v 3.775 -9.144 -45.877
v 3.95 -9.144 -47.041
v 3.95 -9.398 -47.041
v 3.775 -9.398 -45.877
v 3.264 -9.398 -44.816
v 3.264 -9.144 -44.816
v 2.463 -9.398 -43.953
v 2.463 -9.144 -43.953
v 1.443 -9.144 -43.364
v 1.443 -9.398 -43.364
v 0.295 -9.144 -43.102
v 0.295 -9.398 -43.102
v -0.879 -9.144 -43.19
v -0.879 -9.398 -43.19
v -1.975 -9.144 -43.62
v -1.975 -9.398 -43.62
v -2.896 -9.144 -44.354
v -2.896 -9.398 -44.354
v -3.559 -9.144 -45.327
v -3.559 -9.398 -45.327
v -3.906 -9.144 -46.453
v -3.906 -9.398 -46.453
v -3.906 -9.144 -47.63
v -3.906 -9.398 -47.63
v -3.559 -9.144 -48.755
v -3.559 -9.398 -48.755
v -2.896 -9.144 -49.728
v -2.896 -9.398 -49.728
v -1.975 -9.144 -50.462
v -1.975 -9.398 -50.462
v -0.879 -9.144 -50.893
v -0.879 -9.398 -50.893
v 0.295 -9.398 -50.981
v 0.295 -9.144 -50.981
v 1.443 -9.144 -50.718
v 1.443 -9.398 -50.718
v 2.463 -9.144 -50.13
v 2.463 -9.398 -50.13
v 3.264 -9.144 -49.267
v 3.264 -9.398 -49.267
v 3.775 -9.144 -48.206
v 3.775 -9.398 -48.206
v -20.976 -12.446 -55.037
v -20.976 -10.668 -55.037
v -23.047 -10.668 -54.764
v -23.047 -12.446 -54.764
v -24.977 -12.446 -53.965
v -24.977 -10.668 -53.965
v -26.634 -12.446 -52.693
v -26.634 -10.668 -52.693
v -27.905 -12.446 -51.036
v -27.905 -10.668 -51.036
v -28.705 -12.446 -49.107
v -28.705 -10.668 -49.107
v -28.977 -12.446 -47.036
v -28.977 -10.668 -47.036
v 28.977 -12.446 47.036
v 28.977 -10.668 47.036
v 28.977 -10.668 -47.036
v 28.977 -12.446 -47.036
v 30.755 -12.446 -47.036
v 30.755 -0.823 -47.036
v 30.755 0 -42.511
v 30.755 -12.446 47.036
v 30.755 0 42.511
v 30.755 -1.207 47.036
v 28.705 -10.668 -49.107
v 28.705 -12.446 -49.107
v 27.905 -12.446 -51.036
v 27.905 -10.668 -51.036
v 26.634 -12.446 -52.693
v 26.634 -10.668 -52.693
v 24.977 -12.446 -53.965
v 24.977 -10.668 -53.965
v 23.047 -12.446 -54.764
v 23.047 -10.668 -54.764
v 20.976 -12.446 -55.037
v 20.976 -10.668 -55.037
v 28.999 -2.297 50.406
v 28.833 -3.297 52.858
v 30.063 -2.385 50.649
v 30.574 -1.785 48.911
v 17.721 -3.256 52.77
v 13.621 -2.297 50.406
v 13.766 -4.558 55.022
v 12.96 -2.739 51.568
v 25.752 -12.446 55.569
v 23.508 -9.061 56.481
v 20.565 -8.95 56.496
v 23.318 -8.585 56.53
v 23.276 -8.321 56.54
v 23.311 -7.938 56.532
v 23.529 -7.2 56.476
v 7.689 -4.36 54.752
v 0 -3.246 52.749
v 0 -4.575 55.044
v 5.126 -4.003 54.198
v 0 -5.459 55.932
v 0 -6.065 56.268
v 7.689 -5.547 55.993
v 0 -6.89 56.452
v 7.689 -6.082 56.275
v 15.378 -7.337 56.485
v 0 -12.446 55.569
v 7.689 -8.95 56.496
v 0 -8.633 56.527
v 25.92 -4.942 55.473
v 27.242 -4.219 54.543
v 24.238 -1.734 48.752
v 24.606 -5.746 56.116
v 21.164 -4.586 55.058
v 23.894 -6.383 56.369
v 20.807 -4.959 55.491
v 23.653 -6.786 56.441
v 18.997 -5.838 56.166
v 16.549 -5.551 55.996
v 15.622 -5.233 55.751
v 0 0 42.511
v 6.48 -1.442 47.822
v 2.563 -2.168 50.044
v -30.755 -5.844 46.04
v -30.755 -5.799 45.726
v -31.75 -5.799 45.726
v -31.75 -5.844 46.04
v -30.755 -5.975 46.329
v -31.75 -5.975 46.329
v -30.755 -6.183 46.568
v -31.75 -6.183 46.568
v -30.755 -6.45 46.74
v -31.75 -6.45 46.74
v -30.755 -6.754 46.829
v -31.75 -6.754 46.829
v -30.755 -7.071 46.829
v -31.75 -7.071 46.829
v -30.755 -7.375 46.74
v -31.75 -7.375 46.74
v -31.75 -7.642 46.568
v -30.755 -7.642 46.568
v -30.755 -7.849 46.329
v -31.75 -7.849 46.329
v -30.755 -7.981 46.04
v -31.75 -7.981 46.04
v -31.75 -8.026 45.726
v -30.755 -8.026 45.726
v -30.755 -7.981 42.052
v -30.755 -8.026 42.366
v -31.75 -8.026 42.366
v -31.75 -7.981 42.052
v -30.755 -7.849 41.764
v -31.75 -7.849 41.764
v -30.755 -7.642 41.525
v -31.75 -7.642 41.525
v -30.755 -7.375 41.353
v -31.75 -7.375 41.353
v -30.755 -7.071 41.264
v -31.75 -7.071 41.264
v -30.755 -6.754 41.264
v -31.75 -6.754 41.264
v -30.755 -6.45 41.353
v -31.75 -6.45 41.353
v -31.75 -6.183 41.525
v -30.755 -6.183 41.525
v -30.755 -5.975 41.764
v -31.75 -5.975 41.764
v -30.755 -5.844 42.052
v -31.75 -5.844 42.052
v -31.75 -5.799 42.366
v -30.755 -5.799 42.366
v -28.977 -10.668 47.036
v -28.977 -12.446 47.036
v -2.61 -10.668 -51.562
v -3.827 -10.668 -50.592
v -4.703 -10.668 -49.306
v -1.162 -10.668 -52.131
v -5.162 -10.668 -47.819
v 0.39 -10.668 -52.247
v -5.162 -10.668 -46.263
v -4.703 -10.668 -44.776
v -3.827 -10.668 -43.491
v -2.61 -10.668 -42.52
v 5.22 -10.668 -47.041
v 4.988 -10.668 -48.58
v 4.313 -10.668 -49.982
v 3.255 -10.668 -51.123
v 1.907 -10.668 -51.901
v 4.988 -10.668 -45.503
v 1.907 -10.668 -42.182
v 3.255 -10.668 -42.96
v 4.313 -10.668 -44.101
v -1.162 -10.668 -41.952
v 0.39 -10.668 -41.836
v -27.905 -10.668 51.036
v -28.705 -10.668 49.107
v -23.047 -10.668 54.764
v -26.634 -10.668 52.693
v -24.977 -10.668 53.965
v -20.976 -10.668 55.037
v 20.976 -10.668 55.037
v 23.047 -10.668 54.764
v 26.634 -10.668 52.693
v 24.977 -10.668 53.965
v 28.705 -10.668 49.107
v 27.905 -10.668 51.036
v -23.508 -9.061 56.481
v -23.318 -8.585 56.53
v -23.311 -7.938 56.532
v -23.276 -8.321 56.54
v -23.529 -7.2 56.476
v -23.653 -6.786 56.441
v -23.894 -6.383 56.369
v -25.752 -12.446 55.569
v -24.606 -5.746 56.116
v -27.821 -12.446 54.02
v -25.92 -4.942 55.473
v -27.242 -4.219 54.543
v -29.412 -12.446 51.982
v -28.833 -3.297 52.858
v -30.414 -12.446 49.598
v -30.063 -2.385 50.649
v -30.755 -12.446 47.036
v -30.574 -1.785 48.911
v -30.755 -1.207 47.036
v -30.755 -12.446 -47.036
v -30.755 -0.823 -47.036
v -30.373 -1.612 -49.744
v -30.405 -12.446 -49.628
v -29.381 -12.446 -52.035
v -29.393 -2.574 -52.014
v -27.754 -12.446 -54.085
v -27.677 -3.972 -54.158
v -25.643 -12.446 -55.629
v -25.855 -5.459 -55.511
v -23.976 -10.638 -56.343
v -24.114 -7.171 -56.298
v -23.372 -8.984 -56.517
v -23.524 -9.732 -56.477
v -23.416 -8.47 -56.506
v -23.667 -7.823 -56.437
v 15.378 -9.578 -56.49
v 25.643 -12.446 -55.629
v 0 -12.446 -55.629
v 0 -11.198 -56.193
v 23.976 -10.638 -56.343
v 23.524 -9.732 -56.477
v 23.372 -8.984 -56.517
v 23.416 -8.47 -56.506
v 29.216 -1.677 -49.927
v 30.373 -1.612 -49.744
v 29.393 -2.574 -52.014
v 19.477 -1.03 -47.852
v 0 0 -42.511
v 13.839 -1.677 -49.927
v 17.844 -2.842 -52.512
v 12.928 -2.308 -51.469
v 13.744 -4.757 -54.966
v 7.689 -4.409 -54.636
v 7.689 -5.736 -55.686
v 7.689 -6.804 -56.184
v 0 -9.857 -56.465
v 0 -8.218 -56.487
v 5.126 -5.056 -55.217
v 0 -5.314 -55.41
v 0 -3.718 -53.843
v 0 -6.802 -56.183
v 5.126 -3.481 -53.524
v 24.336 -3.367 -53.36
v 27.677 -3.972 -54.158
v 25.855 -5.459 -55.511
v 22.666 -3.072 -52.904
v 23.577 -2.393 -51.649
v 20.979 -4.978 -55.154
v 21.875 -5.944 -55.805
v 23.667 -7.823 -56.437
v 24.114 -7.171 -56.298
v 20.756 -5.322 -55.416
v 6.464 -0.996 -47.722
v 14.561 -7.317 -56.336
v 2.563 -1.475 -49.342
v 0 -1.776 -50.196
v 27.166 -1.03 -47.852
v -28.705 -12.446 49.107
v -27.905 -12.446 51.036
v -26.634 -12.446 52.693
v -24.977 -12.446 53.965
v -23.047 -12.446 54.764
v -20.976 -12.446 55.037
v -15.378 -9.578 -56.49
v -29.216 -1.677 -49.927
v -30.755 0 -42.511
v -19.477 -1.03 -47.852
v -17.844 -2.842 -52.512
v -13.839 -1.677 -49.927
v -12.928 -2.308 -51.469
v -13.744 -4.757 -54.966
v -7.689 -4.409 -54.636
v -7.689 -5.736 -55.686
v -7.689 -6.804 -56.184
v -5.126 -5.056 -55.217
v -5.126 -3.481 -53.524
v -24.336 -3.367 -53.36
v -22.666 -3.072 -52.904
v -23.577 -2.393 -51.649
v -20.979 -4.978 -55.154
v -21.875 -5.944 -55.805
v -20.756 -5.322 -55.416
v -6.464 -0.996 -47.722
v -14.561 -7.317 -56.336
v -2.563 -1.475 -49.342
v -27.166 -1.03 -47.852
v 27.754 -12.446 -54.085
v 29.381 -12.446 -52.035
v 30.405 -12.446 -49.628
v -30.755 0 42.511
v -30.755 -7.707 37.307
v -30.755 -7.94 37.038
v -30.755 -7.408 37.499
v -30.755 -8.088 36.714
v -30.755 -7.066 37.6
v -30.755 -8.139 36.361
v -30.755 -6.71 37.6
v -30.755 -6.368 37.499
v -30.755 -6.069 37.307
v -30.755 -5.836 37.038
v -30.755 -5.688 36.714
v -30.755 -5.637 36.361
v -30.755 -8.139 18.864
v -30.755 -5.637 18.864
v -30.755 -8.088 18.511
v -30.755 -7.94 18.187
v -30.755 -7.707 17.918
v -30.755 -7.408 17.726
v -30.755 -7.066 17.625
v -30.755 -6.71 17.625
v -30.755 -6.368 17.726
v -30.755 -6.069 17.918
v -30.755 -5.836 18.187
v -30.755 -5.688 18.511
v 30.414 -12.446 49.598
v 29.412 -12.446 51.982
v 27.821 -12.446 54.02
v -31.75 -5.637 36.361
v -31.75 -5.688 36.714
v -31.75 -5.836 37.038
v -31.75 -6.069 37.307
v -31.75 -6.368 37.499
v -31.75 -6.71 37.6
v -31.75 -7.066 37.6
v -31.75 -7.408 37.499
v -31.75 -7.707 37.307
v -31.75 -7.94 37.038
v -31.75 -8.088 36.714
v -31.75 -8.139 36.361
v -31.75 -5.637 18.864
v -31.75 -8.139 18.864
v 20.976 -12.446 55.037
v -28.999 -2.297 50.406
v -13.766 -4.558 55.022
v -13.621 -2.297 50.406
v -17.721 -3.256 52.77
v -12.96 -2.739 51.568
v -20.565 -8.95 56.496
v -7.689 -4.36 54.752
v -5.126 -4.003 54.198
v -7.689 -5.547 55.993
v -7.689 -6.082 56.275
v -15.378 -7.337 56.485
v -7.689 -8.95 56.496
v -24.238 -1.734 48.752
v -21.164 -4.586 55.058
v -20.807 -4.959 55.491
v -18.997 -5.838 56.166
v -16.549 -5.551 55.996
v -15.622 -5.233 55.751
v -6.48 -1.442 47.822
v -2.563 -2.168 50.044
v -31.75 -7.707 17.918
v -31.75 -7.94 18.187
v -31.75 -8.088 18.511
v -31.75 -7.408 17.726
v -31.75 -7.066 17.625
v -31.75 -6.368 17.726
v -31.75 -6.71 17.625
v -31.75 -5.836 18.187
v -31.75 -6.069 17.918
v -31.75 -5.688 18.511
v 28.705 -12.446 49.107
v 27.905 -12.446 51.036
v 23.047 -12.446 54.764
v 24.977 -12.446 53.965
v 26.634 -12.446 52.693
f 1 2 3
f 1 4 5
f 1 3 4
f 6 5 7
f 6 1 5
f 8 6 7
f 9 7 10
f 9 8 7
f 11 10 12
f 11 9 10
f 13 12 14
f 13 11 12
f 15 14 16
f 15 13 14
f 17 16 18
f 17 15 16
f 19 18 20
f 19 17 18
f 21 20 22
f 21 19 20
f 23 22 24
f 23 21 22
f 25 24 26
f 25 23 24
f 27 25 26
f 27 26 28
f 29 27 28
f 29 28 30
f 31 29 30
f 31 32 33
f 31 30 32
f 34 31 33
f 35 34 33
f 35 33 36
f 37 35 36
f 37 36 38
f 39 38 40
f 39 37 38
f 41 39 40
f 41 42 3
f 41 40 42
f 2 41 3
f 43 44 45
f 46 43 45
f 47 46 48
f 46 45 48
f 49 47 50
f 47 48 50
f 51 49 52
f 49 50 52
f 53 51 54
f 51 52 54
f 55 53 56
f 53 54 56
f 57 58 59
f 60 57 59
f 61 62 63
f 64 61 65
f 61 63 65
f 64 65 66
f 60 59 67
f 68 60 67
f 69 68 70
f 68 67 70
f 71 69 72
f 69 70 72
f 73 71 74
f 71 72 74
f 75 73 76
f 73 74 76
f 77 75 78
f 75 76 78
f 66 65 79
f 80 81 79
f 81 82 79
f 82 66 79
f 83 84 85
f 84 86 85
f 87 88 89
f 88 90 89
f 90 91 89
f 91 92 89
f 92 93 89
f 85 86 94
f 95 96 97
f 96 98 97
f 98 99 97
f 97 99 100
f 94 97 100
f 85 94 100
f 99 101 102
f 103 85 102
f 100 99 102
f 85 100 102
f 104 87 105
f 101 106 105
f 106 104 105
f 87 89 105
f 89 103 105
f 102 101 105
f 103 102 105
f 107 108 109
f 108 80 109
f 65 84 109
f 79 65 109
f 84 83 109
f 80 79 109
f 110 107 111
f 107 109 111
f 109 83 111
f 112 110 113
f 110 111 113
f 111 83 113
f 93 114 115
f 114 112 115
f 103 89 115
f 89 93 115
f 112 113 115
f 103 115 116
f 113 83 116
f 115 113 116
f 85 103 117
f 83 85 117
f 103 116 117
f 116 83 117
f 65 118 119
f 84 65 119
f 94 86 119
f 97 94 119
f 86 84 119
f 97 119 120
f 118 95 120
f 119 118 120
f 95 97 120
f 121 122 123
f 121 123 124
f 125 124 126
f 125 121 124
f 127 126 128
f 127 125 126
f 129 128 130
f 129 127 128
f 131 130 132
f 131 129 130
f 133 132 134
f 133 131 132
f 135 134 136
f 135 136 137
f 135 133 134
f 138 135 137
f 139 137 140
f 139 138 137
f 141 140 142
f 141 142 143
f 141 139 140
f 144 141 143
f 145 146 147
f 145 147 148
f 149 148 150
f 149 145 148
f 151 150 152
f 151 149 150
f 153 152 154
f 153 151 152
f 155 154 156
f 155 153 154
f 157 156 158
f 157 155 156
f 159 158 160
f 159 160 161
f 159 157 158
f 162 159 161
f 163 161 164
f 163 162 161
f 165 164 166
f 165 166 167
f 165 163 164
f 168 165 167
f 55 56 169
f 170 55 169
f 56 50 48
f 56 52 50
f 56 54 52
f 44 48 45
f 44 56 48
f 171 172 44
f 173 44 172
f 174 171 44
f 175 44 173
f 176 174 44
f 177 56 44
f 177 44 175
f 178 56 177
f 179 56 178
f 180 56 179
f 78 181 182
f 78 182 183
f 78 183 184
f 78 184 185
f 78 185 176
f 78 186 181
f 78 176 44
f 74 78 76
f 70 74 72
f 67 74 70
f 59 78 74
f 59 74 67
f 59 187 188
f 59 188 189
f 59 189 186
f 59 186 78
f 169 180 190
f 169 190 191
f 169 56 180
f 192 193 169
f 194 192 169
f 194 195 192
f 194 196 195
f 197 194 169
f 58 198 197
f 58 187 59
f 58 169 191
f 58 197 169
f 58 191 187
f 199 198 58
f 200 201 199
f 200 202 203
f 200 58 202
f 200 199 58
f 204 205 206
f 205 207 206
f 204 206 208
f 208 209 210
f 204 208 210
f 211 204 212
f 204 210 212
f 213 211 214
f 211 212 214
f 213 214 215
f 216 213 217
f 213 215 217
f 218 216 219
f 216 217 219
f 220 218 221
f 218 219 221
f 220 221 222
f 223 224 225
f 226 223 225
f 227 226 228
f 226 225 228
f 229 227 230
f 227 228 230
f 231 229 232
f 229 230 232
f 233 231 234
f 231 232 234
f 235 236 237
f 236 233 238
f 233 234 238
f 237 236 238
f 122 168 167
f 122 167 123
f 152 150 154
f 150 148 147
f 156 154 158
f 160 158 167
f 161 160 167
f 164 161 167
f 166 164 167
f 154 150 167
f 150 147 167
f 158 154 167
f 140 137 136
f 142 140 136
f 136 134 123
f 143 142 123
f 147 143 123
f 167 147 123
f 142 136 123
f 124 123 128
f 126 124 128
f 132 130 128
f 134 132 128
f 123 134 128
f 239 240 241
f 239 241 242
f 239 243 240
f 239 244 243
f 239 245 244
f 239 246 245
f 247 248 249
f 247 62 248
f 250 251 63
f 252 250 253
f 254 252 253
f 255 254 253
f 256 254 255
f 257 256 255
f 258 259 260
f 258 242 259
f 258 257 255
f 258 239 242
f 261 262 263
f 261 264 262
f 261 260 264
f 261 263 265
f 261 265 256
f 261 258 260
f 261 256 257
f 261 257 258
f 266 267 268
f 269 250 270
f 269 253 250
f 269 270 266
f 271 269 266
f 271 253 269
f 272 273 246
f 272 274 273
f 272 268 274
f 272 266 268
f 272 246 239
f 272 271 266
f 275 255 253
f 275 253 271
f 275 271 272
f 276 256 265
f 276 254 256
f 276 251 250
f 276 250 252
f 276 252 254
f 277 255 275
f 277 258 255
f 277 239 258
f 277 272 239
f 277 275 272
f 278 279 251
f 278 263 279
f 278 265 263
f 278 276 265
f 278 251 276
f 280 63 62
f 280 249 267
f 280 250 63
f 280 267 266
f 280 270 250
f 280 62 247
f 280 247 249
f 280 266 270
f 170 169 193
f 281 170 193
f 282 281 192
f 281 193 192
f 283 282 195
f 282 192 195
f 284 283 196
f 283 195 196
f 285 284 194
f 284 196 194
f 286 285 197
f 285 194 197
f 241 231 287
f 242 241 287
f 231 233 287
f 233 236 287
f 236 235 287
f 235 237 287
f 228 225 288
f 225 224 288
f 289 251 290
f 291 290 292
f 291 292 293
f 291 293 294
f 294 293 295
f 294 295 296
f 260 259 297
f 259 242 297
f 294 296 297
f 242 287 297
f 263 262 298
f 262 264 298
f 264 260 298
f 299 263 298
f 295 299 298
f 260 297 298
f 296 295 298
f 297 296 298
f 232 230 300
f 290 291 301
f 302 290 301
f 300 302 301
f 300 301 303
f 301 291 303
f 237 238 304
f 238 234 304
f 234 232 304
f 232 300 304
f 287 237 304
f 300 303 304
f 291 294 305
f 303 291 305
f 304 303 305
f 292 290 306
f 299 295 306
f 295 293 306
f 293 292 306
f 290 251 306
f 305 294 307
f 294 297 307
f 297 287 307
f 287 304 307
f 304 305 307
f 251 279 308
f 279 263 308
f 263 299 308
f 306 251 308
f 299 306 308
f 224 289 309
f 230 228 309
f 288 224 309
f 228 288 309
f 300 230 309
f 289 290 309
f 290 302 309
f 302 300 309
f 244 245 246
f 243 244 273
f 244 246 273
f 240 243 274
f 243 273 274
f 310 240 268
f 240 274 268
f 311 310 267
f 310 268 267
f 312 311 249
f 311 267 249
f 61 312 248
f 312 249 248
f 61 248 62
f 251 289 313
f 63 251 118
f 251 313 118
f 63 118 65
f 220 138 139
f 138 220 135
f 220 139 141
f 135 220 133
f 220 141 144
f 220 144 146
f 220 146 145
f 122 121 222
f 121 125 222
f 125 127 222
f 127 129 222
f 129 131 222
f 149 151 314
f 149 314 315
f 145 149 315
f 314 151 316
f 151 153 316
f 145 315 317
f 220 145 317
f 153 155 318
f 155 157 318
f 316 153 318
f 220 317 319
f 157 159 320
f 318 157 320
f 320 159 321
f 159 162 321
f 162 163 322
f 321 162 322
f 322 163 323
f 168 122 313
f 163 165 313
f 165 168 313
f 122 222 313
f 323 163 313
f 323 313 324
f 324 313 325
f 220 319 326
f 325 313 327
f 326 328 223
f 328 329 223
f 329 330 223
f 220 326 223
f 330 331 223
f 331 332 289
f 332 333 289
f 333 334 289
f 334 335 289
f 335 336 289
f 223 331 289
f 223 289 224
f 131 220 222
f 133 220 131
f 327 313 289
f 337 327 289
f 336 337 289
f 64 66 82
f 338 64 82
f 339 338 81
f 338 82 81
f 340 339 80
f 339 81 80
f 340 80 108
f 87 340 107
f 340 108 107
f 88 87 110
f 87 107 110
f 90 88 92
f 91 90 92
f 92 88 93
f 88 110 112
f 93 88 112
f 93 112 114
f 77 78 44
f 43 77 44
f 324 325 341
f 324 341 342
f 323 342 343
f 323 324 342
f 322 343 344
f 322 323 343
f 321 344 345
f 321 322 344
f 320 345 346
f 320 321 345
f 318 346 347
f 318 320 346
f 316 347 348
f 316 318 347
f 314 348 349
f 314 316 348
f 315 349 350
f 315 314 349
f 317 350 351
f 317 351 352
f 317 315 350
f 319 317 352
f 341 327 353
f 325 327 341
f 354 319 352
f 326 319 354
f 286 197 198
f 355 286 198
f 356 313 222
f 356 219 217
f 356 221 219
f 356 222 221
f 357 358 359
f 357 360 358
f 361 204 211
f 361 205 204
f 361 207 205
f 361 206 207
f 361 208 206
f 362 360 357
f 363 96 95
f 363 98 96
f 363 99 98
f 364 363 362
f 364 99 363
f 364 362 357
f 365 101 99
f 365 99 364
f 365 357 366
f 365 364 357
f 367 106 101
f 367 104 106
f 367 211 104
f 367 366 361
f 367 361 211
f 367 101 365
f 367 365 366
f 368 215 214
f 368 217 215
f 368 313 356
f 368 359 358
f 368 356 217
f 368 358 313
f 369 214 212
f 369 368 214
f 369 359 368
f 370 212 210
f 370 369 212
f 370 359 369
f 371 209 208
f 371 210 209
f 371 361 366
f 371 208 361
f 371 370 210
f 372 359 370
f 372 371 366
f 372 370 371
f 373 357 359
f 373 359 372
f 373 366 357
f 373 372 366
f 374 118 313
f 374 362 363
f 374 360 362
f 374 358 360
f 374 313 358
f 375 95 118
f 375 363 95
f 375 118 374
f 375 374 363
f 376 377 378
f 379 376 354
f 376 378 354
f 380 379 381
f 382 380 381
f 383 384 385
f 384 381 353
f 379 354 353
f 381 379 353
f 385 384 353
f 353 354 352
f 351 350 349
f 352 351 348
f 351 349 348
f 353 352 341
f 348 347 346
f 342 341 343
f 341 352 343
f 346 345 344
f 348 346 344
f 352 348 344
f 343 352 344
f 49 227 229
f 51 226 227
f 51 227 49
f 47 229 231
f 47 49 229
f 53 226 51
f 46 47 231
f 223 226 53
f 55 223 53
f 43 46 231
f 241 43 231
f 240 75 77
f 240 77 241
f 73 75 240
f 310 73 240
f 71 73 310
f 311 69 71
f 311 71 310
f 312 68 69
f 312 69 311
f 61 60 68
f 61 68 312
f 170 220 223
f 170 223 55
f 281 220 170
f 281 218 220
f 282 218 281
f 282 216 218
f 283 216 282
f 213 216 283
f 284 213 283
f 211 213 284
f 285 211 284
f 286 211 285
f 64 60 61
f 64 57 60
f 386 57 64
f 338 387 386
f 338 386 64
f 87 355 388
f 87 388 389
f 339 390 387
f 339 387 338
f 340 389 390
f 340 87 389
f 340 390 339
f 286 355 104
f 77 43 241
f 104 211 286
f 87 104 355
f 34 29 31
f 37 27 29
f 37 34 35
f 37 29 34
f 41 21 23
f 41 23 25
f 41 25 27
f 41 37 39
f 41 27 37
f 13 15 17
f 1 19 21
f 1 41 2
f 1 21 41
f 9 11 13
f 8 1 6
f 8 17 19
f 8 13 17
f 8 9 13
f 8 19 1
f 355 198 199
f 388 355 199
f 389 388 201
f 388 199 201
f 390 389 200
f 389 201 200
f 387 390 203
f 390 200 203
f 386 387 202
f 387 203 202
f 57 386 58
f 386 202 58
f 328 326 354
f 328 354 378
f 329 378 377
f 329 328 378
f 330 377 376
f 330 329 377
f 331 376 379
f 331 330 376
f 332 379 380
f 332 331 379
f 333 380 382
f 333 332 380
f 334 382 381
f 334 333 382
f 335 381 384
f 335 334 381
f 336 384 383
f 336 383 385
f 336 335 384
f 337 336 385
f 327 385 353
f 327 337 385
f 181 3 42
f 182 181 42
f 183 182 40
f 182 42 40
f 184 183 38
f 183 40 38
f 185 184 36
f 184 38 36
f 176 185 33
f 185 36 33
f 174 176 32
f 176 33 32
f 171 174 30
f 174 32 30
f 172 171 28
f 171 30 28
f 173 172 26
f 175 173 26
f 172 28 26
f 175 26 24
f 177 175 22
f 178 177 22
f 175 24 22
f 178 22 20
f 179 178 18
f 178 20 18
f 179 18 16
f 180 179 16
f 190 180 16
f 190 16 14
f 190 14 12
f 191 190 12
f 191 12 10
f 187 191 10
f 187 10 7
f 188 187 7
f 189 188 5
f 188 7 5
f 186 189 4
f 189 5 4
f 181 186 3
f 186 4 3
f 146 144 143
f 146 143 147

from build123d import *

# Parameters (mm, degrees)
F0_R     = 3.9502971089
F1_DEPTH = 10.668
F2_DEPTH = 12.446
F3_START = 9.144
F3_DEPTH = 9.906
F4_SIZE  = 1.27
F6_DEPTH = 34.798
F8_DEPTH = 31.75


with BuildPart() as f1:
    # F0 (on Front) → F1 (new body)
    with BuildSketch(Plane.XZ):
        with BuildLine():
            Line((-20.9762947197, -56.8147292361), (20.9762947197, -56.8147292361))
            ThreePointArc((20.9762947197, -56.8147292361), (27.8910919329, -53.9505264493), (30.7552947197, -47.0357292361))
            Line((30.7552947197, -47.0357292361), (30.7552947197, 47.0357292361))
            ThreePointArc((30.7552947197, 47.0357292361), (27.8910919329, 53.9505264493), (20.9762947197, 56.8147292361))
            Line((20.9762947197, 56.8147292361), (-20.9762947197, 56.8147292361))
            ThreePointArc((-20.9762947197, 56.8147292361), (-27.8910919329, 53.9505264493), (-30.7552947197, 47.0357292361))
            Line((-30.7552947197, 47.0357292361), (-30.7552947197, -47.0357292361))
            ThreePointArc((-30.7552947197, -47.0357292361), (-27.8910919329, -53.9505264493), (-20.9762947197, -56.8147292361))
        make_face()
        with BuildLine():
            ThreePointArc((20.9762947197, 55.0367310643), (26.6338573688, 52.6932918851), (28.977296548, 47.0357292361))
            Line((28.977296548, 47.0357292361), (28.977296548, -47.0357292361))
            ThreePointArc((28.977296548, -47.0357292361), (26.6338573688, -52.6932918851), (20.9762947197, -55.0367310643))
            Line((20.9762947197, -55.0367310643), (-20.9762947197, -55.0367310643))
            ThreePointArc((-20.9762947197, -55.0367310643), (-26.6338573688, -52.6932918851), (-28.977296548, -47.0357292361))
            Line((-28.977296548, -47.0357292361), (-28.977296548, 47.0357292361))
            ThreePointArc((-28.977296548, 47.0357292361), (-26.6338573688, 52.6932918851), (-20.9762947197, 55.0367310643))
            Line((-20.9762947197, 55.0367310643), (20.9762947197, 55.0367310643))
        make_face(mode=Mode.SUBTRACT)
        with BuildLine():
            Line((28.977296548, -47.0357292361), (28.977296548, 47.0357292361))
            ThreePointArc((28.977296548, 47.0357292361), (26.6338573688, 52.6932918851), (20.9762947197, 55.0367310643))
            Line((20.9762947197, 55.0367310643), (-20.9762947197, 55.0367310643))
            ThreePointArc((-20.9762947197, 55.0367310643), (-26.6338573688, 52.6932918851), (-28.977296548, 47.0357292361))
            Line((-28.977296548, 47.0357292361), (-28.977296548, -47.0357292361))
            ThreePointArc((-28.977296548, -47.0357292361), (-26.6338573688, -52.6932918851), (-20.9762947197, -55.0367310643))
            Line((-20.9762947197, -55.0367310643), (20.9762947197, -55.0367310643))
            ThreePointArc((20.9762947197, -55.0367310643), (26.6338573688, -52.6932918851), (28.977296548, -47.0357292361))
        make_face()
        with Locations((0, -47.0412708819)):
            Circle(F0_R, mode=Mode.SUBTRACT)
        with Locations((0, -47.0412708819)):
            Circle(F0_R)
    extrude(amount=F1_DEPTH)

    # F0 (on Front) → F2 (join)
    with BuildSketch(Plane.XZ):
        with BuildLine():
            Line((-20.9762947197, -56.8147292361), (20.9762947197, -56.8147292361))
            ThreePointArc((20.9762947197, -56.8147292361), (27.8910919329, -53.9505264493), (30.7552947197, -47.0357292361))
            Line((30.7552947197, -47.0357292361), (30.7552947197, 47.0357292361))
            ThreePointArc((30.7552947197, 47.0357292361), (27.8910919329, 53.9505264493), (20.9762947197, 56.8147292361))
            Line((20.9762947197, 56.8147292361), (-20.9762947197, 56.8147292361))
            ThreePointArc((-20.9762947197, 56.8147292361), (-27.8910919329, 53.9505264493), (-30.7552947197, 47.0357292361))
            Line((-30.7552947197, 47.0357292361), (-30.7552947197, -47.0357292361))
            ThreePointArc((-30.7552947197, -47.0357292361), (-27.8910919329, -53.9505264493), (-20.9762947197, -56.8147292361))
        make_face()
        with BuildLine():
            ThreePointArc((20.9762947197, 55.0367310643), (26.6338573688, 52.6932918851), (28.977296548, 47.0357292361))
            Line((28.977296548, 47.0357292361), (28.977296548, -47.0357292361))
            ThreePointArc((28.977296548, -47.0357292361), (26.6338573688, -52.6932918851), (20.9762947197, -55.0367310643))
            Line((20.9762947197, -55.0367310643), (-20.9762947197, -55.0367310643))
            ThreePointArc((-20.9762947197, -55.0367310643), (-26.6338573688, -52.6932918851), (-28.977296548, -47.0357292361))
            Line((-28.977296548, -47.0357292361), (-28.977296548, 47.0357292361))
            ThreePointArc((-28.977296548, 47.0357292361), (-26.6338573688, 52.6932918851), (-20.9762947197, 55.0367310643))
            Line((-20.9762947197, 55.0367310643), (20.9762947197, 55.0367310643))
        make_face(mode=Mode.SUBTRACT)
    extrude(amount=F2_DEPTH)

    # F0 (on Front) → F3 (cut)
    with BuildSketch(Plane.XZ.offset(F3_START)):
        with Locations((0, -47.0412708819)):
            Circle(F0_R)
    extrude(amount=F3_DEPTH, mode=Mode.SUBTRACT)

    # F4
    f4_edges = [f1.edges().sort_by_distance(p)[0] for p in [
        (-3.950297, -10.668, -47.041271),
    ]]
    chamfer(f4_edges, length=F4_SIZE)

    # F5 (on Right) → F6 (cut, symmetric)
    with BuildSketch(Plane.YZ):
        with BuildLine():
            add(Edge.make_bspline(
                [(0, 42.5107741586), (-3.4692891864, 56.6401603672), (-7.0298959202, 56.2049565258), (-9.0349917024, 56.7605619607), (-12.6958908513, 55.4829351604)],
                knots=[0, 0, 0, 0, 0.6298452958, 1, 1, 1, 1], degree=3))
            Line((0, 42.5107741586), (8.7041649967, 42.5107741586))
            Line((8.7041649967, 42.5107741586), (-8.2542682061, 71.9105228782))
            Line((-8.2542682061, 71.9105228782), (-15.3796598309, 57.517234236))
            Line((-15.3796598309, 57.517234236), (-12.6958908513, 55.4829351604))
        make_face()
        with BuildLine():
            Line((6.5665482543, -51.9287921488), (0, -42.5107741586))
            add(Edge.make_bspline(
                [(0, -42.5107741586), (-1.797141266, -55.9935070445), (-8.9519337422, -57.0148502385), (-11.6335880011, -56.1241805553), (-12.6958908513, -55.4829351604)],
                knots=[0, 0, 0, 0, 0.6945936189, 1, 1, 1, 1], degree=3))
            Line((-12.6958908513, -55.4829351604), (-17.793700099, -53.5118058324))
            Line((-17.793700099, -53.5118058324), (-3.83652444, -63.5))
            Line((-3.83652444, -63.5), (6.5665482543, -51.9287921488))
        make_face()
    extrude(amount=F6_DEPTH, both=True, mode=Mode.SUBTRACT)

    # F7 (on Right) → F8 (join)
    with BuildSketch(Plane.YZ):
        with BuildLine():
            Line((-5.6370437269, 18.863574058), (-5.6370437269, 36.3614898325))
            ThreePointArc((-5.6370437269, 36.3614898325), (-6.8880598859, 37.6125059916), (-8.139076045, 36.3614898325))
            Line((-8.139076045, 36.3614898325), (-8.139076045, 18.863574058))
            ThreePointArc((-8.139076045, 18.863574058), (-6.8880598859, 17.6125578989), (-5.6370437269, 18.863574058))
        make_face()
        with BuildLine():
            Line((-5.7985300421, 42.3662230318), (-5.7985300421, 45.7263958405))
            ThreePointArc((-5.7985300421, 45.7263958405), (-6.9122834376, 46.8401492361), (-8.0260368332, 45.7263958405))
            Line((-8.0260368332, 45.7263958405), (-8.0260368332, 42.3662230318))
            ThreePointArc((-8.0260368332, 42.3662230318), (-6.9122834376, 41.2524696362), (-5.7985300421, 42.3662230318))
        make_face()
    extrude(amount=-F8_DEPTH)


solid = f1.part
